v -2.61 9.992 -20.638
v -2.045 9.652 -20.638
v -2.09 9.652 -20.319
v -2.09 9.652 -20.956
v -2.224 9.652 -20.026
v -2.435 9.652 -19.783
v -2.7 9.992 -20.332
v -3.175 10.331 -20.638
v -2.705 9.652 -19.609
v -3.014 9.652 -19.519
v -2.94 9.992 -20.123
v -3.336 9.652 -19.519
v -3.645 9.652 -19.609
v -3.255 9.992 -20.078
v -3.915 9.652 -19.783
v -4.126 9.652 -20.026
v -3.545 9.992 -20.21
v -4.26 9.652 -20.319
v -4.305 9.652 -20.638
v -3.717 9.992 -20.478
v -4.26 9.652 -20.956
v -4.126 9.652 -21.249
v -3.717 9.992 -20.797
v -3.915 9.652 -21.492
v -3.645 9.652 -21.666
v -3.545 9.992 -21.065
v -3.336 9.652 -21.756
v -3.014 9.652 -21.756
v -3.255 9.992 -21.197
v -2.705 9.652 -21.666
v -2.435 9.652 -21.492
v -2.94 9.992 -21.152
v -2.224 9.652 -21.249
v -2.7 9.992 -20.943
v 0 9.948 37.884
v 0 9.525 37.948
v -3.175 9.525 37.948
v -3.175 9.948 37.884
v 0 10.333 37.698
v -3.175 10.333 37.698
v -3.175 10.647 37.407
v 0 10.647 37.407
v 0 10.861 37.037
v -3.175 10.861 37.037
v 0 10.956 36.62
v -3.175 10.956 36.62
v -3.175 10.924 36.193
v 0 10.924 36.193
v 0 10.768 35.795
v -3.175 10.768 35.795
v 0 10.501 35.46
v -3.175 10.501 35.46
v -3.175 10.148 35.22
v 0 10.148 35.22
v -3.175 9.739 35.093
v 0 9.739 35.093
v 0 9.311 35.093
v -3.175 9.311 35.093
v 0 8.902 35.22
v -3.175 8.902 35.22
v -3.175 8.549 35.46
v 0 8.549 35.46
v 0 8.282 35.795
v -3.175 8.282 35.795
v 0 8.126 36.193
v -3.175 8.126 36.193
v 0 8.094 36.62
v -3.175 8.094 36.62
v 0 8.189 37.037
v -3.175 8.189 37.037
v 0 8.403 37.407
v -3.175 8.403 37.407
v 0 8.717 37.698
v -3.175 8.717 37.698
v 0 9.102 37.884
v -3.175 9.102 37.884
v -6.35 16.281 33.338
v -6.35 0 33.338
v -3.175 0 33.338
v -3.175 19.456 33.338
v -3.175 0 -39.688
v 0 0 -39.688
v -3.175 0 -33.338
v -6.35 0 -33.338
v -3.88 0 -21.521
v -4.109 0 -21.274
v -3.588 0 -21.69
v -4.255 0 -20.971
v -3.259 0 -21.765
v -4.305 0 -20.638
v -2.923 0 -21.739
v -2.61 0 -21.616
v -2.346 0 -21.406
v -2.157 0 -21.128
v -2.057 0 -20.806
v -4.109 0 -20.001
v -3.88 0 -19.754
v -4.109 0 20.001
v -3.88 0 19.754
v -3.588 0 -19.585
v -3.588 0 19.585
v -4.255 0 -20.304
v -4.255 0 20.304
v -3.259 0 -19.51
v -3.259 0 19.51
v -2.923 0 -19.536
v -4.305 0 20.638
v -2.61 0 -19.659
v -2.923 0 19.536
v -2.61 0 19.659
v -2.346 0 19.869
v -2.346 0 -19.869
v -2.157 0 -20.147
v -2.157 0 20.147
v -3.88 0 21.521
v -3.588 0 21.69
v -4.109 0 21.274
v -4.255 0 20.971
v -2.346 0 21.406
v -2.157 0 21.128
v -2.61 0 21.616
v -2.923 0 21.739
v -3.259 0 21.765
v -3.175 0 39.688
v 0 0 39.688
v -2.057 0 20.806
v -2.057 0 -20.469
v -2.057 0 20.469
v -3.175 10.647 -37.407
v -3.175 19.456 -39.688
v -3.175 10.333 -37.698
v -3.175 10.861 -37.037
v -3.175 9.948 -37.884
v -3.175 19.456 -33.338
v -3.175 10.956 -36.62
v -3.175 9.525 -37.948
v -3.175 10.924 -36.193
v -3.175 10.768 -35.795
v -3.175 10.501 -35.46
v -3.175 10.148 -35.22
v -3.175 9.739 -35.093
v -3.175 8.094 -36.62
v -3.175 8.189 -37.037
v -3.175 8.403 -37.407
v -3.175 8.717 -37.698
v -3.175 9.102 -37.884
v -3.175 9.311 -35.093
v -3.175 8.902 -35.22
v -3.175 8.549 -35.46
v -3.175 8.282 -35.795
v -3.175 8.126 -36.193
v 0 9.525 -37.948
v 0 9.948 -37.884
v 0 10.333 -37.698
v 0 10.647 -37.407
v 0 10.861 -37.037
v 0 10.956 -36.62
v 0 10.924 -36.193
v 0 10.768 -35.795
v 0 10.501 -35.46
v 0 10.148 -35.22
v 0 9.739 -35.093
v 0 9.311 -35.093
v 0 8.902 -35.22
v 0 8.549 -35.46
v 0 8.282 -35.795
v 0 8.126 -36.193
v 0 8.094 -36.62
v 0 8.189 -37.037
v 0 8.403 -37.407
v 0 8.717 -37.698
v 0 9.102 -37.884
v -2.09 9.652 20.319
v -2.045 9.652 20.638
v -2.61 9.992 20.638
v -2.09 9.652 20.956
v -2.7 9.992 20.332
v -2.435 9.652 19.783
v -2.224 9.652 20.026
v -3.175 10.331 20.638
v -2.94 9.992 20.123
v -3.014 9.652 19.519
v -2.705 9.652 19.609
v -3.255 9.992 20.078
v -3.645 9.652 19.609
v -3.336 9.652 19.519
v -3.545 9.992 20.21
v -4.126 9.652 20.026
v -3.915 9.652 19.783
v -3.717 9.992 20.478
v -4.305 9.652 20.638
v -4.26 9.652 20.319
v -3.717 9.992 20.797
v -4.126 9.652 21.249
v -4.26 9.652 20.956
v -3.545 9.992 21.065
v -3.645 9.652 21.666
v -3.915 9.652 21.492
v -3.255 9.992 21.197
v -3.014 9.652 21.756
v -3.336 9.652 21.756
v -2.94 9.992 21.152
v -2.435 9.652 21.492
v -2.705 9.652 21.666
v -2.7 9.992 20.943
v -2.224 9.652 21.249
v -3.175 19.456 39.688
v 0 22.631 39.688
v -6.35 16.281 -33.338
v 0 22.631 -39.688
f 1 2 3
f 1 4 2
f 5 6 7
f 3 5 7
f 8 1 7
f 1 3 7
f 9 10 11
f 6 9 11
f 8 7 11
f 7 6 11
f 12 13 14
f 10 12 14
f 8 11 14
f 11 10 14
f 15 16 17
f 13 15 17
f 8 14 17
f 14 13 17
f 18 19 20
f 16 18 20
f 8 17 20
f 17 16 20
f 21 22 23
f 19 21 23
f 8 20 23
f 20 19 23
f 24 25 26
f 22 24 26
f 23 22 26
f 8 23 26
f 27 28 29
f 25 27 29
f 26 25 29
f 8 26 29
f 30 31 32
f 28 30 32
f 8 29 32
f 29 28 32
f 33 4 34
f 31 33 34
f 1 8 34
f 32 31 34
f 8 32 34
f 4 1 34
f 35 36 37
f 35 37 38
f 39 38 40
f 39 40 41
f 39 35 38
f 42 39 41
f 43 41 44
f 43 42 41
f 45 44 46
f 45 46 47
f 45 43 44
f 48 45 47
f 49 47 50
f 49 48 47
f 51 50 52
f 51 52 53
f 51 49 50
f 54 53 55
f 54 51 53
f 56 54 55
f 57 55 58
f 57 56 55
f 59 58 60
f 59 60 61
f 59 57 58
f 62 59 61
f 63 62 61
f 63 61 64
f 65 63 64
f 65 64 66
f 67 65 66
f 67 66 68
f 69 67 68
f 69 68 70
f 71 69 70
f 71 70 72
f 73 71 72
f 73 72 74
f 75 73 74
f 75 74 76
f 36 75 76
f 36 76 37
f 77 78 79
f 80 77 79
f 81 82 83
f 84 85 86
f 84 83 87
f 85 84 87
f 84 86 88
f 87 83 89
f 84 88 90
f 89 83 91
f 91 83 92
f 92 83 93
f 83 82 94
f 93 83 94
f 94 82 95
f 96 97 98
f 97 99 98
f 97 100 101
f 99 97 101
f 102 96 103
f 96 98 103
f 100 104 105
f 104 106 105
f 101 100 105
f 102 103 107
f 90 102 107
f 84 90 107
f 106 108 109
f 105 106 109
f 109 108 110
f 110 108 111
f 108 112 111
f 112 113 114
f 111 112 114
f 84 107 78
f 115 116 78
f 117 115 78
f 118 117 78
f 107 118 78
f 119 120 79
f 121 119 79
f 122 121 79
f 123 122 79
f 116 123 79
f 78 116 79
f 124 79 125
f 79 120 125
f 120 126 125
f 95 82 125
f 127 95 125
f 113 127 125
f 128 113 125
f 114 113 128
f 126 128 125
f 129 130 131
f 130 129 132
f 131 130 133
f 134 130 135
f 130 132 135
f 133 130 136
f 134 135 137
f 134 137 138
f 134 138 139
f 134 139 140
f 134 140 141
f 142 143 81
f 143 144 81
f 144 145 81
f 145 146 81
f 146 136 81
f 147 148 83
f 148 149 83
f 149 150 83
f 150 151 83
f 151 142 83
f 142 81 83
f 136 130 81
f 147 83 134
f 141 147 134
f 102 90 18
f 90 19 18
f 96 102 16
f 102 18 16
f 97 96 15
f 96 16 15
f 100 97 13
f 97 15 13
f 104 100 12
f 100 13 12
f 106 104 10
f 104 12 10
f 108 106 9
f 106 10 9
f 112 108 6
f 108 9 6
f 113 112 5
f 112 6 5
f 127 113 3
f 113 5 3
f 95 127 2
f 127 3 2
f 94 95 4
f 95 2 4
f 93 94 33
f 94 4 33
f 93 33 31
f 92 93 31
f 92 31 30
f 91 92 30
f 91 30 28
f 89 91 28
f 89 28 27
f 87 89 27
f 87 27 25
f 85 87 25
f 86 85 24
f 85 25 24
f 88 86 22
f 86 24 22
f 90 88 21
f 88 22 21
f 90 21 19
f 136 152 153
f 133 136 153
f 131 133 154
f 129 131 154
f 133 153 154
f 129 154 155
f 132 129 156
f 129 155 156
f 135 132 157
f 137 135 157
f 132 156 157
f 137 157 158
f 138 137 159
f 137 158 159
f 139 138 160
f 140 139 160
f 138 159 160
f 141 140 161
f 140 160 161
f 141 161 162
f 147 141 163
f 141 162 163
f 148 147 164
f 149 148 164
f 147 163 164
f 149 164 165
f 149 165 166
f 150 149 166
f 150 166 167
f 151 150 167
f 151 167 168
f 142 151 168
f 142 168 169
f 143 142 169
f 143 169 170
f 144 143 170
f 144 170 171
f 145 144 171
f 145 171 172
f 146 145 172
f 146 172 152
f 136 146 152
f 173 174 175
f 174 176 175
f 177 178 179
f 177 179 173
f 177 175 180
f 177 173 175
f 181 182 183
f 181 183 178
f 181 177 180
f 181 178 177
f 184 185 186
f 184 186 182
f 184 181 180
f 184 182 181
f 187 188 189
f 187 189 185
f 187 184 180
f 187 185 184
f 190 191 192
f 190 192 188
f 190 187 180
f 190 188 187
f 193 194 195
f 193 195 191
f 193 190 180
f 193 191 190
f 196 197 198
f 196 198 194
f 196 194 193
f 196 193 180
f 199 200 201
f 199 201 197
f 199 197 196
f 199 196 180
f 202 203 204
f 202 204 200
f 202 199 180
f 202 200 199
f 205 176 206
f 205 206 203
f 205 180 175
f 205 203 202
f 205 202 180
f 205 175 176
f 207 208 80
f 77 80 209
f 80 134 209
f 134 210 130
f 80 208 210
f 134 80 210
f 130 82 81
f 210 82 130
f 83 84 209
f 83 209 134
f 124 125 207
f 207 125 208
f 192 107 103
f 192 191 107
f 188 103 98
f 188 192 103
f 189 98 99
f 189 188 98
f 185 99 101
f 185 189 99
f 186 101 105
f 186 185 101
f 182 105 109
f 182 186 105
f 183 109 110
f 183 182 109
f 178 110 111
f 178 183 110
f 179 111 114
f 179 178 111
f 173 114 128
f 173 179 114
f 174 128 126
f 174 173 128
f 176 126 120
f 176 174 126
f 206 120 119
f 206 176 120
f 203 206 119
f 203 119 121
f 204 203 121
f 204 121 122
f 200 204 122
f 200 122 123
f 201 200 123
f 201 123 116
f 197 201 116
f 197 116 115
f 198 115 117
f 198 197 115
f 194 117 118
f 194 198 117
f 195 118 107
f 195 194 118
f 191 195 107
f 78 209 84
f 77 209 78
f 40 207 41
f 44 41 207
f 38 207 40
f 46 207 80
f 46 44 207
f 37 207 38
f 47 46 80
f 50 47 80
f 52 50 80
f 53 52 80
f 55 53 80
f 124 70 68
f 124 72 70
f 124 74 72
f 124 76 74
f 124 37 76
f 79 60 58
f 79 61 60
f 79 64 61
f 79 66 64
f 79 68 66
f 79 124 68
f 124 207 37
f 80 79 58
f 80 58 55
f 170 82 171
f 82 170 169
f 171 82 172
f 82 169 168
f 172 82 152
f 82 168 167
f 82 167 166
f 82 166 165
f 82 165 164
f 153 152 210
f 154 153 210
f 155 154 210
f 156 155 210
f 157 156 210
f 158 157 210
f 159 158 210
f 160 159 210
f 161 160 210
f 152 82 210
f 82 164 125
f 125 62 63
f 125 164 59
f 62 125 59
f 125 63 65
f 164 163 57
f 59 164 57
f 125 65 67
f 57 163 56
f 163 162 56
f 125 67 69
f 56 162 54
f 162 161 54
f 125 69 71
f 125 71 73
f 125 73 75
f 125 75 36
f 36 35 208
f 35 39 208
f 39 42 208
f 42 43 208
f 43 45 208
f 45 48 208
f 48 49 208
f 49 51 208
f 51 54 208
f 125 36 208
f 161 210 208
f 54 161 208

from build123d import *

# Parameters (mm, degrees)
SKETCH1_W                 = 39.6875
SKETCH1_H                 = 22.6314
SKETCH1_R                 = 1.4351
BOSS_EXTRUDE1_DEPTH       = 6.35
SKETCH2_W                 = 3.175
SKETCH2_H                 = 6.35
CUT_EXTRUDE1_DEPTH        = 47.125919202
CUT_EXTRUDE2_DEPTH        = 47.125919202
F_4_40_TAPPED_HOLE1_D     = 2.2606
F_4_40_TAPPED_HOLE1_DEPTH = 9.652
F_4_40_TAPPED_HOLE1_TIP   = 0.679152758


with BuildPart() as part:
    # Sketch1 → Boss-Extrude1 (new body)
    with BuildSketch(Plane(origin=(0, 0, 0), x_dir=(0, 0, -1), z_dir=(1, 0, 0))):
        with Locations((19.84375, 11.3157)):
            Rectangle(SKETCH1_W, SKETCH1_H)
        with Locations((36.5125, 9.525)):
            Circle(SKETCH1_R, mode=Mode.SUBTRACT)
    extrude(amount=-BOSS_EXTRUDE1_DEPTH)

    # Sketch2 → Cut-Extrude1 (cut, through all)
    with BuildSketch(Plane.XZ):
        with Locations((-4.7625, -36.5125)):
            Rectangle(SKETCH2_W, SKETCH2_H)
    extrude(amount=-CUT_EXTRUDE1_DEPTH, mode=Mode.SUBTRACT)

    # Sketch3 → Cut-Extrude2 (cut, through all)
    with BuildSketch(Plane.XY):
        Polygon((0, 22.6314), (-6.35, 16.2814), (-6.35, 22.6314), align=None)
    extrude(amount=-CUT_EXTRUDE2_DEPTH, mode=Mode.SUBTRACT)

    # #4-40 Tapped Hole1
    with Locations(Plane.XZ):
        with Locations((-3.175, -20.6375)):
            Hole(F_4_40_TAPPED_HOLE1_D / 2, depth=F_4_40_TAPPED_HOLE1_DEPTH)
            with Locations((0, 0, -(F_4_40_TAPPED_HOLE1_DEPTH + F_4_40_TAPPED_HOLE1_TIP / 2))):  # 118° drill point
                Cone(0, F_4_40_TAPPED_HOLE1_D / 2, F_4_40_TAPPED_HOLE1_TIP, mode=Mode.SUBTRACT)

    # Mirror1: part across plane


with BuildPart() as part_1:
    add(part.part)
    add(part.part.mirror(Plane(origin=(-6.35, 0, 0), x_dir=(1, 0, 0), z_dir=(0, 0, 1))))


solid = part_1.part
